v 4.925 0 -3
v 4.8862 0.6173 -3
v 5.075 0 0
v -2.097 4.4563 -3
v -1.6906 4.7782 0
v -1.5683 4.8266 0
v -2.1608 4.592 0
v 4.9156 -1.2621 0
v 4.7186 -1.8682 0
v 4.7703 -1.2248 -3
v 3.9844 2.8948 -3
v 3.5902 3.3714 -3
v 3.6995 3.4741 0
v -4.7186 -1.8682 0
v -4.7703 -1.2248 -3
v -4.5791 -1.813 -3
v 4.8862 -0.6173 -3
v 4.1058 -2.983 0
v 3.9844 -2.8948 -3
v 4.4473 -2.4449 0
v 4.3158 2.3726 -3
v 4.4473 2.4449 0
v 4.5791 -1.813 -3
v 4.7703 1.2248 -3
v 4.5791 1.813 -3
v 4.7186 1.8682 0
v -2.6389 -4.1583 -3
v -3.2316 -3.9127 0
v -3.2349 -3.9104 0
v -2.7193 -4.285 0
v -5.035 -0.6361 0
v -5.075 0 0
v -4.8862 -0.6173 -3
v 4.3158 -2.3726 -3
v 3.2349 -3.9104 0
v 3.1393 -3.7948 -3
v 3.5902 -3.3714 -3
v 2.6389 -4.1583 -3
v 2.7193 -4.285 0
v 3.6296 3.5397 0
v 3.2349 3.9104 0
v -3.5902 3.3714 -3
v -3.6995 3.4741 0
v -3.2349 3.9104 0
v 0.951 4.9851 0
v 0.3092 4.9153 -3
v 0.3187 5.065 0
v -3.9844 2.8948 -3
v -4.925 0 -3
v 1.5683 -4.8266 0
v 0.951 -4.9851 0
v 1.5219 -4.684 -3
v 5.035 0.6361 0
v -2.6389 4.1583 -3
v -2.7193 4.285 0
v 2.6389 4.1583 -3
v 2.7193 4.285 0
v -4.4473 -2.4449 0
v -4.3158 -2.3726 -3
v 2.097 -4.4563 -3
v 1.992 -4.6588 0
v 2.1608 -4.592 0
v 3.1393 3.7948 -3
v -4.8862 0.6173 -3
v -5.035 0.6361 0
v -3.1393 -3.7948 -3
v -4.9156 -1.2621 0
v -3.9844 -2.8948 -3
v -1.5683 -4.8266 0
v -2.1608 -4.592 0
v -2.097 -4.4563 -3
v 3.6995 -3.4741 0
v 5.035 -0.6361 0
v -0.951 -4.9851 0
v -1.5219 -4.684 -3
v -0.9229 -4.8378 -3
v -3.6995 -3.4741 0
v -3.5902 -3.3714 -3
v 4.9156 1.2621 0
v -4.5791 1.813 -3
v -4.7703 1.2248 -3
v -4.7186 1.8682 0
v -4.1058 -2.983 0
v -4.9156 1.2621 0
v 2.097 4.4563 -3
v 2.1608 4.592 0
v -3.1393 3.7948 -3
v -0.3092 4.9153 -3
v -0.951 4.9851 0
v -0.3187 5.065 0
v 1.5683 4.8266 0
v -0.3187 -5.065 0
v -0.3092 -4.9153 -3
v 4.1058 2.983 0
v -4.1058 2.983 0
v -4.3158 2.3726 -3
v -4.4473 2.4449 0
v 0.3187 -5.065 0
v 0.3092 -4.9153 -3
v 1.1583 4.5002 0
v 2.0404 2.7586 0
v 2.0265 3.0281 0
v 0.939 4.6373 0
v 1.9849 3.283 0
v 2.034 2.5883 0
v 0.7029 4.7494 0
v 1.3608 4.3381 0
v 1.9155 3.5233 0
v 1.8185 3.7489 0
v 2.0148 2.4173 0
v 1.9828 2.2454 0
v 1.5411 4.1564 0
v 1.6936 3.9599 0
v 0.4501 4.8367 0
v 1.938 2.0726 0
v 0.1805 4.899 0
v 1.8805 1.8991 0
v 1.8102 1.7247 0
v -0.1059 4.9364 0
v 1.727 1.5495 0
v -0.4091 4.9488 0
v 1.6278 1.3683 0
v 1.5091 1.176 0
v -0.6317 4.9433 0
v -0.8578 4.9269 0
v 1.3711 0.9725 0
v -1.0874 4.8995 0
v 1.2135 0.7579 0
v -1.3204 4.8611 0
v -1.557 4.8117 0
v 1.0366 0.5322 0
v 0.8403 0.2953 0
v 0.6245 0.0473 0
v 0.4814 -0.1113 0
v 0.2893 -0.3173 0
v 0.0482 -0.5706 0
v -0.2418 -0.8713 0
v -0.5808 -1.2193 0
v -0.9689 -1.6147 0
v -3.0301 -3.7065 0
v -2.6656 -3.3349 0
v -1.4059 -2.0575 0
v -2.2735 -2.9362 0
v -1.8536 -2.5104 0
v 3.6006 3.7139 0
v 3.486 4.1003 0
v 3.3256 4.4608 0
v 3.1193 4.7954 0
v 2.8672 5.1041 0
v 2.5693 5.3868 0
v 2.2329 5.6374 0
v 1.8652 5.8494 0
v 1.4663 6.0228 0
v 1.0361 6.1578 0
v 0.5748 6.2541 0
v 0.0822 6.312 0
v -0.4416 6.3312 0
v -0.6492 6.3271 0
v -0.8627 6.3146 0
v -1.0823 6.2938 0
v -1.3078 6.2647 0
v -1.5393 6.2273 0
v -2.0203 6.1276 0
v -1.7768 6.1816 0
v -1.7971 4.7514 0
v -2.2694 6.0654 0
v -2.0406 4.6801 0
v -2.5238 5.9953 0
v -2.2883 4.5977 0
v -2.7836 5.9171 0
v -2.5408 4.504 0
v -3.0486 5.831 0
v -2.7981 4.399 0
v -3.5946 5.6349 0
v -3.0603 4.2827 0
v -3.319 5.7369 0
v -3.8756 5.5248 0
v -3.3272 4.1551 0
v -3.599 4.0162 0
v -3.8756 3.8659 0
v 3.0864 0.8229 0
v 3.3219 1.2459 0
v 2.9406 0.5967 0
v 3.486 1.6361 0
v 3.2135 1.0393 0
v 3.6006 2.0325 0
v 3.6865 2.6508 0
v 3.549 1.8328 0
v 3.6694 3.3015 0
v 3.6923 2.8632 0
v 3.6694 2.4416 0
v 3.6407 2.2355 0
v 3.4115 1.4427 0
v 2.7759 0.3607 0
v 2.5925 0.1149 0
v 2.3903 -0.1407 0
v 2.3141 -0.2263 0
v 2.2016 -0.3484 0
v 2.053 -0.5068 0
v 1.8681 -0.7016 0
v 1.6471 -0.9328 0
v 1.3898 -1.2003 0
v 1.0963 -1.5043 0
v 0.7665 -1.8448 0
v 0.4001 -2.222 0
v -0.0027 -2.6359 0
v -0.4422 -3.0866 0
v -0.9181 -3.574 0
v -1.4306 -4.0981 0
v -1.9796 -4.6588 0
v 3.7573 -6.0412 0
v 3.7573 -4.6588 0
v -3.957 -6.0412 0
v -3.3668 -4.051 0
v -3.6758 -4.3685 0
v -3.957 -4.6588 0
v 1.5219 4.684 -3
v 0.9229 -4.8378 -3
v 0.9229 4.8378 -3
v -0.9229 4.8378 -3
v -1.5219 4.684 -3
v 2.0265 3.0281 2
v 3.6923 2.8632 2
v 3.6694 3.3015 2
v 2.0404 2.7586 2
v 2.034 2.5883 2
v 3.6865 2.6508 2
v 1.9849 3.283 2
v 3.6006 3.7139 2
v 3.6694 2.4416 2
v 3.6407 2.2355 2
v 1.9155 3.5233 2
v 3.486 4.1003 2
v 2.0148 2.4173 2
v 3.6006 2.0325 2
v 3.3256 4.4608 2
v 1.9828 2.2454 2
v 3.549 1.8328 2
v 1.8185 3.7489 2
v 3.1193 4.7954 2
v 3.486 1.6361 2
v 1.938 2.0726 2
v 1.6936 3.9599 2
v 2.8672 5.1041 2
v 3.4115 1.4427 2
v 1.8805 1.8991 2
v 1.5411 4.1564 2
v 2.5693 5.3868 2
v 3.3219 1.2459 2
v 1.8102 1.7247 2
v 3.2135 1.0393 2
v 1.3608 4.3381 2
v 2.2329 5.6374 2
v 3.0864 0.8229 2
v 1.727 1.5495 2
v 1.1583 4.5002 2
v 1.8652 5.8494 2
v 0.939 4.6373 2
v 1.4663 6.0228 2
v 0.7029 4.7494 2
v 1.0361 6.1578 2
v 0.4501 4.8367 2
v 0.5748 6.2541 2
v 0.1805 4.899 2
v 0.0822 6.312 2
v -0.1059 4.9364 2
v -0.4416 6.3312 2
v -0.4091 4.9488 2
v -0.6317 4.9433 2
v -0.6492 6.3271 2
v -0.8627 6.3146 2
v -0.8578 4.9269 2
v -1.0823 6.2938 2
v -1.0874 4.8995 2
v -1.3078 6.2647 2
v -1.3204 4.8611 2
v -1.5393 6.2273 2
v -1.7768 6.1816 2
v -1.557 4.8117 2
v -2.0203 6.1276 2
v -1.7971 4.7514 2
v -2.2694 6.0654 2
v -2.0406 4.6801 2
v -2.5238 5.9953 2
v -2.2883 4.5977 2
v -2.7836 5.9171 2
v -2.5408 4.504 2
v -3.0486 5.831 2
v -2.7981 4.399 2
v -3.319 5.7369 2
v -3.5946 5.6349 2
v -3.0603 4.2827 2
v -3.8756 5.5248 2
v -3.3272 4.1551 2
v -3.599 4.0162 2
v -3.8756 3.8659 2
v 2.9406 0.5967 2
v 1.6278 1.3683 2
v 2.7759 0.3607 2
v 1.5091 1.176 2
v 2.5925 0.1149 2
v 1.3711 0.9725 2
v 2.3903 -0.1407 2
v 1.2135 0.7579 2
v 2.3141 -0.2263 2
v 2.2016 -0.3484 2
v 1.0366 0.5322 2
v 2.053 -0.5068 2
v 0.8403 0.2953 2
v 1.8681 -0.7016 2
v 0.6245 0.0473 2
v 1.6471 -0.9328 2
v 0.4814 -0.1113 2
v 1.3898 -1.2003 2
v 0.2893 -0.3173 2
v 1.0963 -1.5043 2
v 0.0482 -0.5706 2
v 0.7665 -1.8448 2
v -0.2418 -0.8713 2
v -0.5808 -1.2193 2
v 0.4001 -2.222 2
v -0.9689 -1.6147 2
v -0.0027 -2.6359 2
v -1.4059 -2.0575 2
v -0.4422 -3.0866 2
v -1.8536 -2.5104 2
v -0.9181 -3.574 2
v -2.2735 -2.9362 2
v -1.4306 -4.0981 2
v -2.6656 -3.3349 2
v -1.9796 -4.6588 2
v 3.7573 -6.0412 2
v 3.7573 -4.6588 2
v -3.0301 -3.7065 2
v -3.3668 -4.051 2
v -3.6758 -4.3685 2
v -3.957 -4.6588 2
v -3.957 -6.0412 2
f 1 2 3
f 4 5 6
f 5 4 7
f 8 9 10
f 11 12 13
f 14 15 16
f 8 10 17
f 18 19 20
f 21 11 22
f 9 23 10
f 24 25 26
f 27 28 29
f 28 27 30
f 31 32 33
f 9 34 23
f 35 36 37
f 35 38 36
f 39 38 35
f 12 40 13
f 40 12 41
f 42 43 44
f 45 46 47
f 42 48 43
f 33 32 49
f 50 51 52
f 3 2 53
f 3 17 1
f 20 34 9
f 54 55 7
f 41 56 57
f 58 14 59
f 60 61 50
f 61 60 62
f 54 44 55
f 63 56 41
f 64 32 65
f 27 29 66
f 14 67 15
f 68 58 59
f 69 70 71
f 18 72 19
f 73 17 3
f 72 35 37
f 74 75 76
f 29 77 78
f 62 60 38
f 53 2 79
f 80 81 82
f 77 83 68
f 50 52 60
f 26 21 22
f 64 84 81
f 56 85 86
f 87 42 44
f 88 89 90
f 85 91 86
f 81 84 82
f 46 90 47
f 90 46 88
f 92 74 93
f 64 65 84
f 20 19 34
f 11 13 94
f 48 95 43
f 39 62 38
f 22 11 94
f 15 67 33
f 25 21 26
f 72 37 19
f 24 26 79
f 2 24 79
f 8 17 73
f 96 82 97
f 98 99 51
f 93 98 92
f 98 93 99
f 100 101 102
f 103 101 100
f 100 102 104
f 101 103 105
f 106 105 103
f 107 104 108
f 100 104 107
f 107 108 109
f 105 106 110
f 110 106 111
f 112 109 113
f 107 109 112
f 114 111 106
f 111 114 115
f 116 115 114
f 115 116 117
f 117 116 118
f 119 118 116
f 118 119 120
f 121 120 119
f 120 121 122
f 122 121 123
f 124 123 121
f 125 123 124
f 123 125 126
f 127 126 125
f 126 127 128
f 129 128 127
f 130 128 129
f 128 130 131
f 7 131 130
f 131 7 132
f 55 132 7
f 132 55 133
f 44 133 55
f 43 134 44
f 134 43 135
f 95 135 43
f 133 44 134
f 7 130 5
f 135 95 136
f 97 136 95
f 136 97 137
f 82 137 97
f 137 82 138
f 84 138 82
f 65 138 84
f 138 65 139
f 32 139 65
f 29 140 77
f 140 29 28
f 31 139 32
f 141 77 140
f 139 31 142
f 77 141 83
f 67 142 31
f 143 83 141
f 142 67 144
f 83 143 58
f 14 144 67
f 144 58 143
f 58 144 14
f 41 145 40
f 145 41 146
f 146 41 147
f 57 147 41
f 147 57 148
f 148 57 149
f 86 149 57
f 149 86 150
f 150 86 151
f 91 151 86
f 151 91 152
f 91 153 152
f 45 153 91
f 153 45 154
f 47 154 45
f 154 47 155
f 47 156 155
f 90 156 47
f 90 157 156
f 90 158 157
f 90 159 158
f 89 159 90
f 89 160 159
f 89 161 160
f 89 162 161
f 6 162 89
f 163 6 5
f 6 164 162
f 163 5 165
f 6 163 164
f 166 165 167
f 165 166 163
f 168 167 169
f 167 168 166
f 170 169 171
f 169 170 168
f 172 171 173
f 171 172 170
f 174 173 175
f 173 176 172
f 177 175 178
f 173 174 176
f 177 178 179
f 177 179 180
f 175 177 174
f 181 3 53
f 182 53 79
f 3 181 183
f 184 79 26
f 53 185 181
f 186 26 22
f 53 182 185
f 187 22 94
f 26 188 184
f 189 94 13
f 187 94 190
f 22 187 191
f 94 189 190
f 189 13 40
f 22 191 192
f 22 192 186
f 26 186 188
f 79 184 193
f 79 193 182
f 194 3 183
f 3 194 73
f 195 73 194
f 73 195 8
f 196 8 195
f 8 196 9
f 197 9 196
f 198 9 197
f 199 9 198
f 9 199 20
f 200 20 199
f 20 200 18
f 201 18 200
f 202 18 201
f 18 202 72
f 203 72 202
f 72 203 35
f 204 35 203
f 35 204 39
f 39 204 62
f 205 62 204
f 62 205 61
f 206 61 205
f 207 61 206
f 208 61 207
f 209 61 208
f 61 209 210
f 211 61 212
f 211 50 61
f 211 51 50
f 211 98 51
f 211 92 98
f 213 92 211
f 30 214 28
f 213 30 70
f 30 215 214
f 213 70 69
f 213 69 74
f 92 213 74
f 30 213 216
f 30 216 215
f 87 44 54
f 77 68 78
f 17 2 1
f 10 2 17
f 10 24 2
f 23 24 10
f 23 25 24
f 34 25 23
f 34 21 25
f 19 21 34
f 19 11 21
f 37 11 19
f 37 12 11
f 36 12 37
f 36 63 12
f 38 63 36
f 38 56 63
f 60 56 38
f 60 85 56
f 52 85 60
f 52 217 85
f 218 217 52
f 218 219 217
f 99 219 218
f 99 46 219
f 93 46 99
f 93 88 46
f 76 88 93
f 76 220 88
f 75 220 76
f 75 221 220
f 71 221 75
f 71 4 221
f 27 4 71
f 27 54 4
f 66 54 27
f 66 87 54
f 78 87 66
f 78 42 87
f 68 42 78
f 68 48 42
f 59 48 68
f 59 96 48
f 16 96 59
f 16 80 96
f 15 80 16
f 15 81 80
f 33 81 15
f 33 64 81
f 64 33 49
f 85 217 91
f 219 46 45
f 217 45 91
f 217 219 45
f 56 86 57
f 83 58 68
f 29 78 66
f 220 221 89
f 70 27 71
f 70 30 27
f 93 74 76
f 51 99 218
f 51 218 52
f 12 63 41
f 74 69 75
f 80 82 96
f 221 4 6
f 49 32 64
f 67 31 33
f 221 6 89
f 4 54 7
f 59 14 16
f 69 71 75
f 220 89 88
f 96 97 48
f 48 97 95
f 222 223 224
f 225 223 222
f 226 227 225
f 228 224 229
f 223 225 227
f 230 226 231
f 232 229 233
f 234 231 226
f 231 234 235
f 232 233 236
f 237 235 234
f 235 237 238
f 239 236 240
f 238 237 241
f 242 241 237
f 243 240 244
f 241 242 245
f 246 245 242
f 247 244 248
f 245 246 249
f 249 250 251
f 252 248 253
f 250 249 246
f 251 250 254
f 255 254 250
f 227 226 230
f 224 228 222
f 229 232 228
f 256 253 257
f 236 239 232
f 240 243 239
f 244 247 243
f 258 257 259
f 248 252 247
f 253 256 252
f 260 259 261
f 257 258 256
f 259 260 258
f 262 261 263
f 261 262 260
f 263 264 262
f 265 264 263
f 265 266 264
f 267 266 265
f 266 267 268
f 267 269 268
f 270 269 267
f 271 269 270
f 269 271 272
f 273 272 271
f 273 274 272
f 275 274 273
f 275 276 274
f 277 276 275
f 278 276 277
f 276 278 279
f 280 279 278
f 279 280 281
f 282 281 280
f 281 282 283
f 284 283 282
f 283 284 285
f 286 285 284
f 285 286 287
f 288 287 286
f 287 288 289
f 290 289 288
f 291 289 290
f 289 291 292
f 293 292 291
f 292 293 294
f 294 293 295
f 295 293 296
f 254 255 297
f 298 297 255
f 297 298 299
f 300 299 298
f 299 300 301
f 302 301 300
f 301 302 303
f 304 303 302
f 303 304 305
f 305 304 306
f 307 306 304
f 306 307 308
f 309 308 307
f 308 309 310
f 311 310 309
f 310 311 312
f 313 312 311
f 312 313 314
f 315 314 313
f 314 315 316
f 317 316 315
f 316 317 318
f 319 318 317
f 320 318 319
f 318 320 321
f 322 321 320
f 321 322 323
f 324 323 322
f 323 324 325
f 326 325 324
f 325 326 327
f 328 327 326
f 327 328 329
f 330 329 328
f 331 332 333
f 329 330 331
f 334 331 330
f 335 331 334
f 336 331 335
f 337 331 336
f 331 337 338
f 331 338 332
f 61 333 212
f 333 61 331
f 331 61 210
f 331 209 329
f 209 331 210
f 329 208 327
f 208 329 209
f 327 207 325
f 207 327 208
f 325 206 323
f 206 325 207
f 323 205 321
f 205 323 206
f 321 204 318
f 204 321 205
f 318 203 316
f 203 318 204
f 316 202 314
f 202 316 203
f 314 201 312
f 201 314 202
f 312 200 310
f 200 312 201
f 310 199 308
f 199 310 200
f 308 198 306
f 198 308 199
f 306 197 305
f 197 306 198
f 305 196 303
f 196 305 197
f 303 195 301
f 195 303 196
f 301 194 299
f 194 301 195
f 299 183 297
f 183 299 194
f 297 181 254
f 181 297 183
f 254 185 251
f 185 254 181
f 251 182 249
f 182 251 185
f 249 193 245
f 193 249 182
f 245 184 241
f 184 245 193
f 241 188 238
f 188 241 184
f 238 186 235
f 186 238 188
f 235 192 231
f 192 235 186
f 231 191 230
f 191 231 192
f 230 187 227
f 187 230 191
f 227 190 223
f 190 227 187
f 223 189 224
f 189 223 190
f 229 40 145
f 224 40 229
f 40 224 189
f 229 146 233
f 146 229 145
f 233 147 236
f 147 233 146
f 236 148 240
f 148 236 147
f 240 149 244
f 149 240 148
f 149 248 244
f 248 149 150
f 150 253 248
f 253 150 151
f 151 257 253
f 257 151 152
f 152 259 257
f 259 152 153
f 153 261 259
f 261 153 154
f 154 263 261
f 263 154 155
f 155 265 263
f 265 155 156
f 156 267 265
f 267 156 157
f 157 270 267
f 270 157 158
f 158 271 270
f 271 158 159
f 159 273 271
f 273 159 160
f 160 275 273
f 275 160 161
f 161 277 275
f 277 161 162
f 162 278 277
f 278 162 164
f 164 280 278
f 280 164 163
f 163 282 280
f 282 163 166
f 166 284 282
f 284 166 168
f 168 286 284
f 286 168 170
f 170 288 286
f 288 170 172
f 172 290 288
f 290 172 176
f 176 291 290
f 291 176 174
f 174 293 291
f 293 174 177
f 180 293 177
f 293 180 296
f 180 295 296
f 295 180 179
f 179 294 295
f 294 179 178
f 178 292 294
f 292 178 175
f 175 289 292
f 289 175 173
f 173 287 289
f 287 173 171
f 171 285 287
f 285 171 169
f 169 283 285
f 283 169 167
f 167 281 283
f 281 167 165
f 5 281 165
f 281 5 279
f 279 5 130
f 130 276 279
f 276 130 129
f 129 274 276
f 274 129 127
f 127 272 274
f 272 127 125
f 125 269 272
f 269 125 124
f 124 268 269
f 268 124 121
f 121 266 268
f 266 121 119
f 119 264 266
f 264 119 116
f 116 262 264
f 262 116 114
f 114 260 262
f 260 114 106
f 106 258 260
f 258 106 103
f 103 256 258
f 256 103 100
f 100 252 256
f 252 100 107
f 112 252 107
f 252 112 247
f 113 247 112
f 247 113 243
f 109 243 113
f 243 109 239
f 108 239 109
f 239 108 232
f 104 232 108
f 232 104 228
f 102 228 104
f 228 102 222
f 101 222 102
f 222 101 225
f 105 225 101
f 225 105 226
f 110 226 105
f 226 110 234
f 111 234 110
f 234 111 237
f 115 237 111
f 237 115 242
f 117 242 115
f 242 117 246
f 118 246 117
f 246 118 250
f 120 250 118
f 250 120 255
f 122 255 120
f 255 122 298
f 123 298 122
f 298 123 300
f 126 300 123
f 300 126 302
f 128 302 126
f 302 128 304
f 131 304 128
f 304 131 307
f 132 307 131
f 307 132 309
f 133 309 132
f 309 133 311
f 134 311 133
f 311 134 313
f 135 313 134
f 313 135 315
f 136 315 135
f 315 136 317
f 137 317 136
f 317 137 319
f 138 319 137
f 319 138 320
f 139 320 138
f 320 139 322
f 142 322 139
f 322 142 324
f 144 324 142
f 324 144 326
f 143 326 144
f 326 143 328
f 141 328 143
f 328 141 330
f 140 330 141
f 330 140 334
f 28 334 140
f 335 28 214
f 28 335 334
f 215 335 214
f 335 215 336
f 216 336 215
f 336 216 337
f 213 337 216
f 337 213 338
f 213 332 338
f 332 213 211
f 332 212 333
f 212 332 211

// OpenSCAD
$fn = 50;

difference() {
	union() {
		translate(v = [0, 0, -3.0]) {
			cylinder(h = 3, r1 = 4.925, r2 = 5.075);
		}
		linear_extrude(height = 2) {
			text(font = "Impact", halign = "center", size = 12, text = "2", valign = "center");
		}
	}
	union();
}
